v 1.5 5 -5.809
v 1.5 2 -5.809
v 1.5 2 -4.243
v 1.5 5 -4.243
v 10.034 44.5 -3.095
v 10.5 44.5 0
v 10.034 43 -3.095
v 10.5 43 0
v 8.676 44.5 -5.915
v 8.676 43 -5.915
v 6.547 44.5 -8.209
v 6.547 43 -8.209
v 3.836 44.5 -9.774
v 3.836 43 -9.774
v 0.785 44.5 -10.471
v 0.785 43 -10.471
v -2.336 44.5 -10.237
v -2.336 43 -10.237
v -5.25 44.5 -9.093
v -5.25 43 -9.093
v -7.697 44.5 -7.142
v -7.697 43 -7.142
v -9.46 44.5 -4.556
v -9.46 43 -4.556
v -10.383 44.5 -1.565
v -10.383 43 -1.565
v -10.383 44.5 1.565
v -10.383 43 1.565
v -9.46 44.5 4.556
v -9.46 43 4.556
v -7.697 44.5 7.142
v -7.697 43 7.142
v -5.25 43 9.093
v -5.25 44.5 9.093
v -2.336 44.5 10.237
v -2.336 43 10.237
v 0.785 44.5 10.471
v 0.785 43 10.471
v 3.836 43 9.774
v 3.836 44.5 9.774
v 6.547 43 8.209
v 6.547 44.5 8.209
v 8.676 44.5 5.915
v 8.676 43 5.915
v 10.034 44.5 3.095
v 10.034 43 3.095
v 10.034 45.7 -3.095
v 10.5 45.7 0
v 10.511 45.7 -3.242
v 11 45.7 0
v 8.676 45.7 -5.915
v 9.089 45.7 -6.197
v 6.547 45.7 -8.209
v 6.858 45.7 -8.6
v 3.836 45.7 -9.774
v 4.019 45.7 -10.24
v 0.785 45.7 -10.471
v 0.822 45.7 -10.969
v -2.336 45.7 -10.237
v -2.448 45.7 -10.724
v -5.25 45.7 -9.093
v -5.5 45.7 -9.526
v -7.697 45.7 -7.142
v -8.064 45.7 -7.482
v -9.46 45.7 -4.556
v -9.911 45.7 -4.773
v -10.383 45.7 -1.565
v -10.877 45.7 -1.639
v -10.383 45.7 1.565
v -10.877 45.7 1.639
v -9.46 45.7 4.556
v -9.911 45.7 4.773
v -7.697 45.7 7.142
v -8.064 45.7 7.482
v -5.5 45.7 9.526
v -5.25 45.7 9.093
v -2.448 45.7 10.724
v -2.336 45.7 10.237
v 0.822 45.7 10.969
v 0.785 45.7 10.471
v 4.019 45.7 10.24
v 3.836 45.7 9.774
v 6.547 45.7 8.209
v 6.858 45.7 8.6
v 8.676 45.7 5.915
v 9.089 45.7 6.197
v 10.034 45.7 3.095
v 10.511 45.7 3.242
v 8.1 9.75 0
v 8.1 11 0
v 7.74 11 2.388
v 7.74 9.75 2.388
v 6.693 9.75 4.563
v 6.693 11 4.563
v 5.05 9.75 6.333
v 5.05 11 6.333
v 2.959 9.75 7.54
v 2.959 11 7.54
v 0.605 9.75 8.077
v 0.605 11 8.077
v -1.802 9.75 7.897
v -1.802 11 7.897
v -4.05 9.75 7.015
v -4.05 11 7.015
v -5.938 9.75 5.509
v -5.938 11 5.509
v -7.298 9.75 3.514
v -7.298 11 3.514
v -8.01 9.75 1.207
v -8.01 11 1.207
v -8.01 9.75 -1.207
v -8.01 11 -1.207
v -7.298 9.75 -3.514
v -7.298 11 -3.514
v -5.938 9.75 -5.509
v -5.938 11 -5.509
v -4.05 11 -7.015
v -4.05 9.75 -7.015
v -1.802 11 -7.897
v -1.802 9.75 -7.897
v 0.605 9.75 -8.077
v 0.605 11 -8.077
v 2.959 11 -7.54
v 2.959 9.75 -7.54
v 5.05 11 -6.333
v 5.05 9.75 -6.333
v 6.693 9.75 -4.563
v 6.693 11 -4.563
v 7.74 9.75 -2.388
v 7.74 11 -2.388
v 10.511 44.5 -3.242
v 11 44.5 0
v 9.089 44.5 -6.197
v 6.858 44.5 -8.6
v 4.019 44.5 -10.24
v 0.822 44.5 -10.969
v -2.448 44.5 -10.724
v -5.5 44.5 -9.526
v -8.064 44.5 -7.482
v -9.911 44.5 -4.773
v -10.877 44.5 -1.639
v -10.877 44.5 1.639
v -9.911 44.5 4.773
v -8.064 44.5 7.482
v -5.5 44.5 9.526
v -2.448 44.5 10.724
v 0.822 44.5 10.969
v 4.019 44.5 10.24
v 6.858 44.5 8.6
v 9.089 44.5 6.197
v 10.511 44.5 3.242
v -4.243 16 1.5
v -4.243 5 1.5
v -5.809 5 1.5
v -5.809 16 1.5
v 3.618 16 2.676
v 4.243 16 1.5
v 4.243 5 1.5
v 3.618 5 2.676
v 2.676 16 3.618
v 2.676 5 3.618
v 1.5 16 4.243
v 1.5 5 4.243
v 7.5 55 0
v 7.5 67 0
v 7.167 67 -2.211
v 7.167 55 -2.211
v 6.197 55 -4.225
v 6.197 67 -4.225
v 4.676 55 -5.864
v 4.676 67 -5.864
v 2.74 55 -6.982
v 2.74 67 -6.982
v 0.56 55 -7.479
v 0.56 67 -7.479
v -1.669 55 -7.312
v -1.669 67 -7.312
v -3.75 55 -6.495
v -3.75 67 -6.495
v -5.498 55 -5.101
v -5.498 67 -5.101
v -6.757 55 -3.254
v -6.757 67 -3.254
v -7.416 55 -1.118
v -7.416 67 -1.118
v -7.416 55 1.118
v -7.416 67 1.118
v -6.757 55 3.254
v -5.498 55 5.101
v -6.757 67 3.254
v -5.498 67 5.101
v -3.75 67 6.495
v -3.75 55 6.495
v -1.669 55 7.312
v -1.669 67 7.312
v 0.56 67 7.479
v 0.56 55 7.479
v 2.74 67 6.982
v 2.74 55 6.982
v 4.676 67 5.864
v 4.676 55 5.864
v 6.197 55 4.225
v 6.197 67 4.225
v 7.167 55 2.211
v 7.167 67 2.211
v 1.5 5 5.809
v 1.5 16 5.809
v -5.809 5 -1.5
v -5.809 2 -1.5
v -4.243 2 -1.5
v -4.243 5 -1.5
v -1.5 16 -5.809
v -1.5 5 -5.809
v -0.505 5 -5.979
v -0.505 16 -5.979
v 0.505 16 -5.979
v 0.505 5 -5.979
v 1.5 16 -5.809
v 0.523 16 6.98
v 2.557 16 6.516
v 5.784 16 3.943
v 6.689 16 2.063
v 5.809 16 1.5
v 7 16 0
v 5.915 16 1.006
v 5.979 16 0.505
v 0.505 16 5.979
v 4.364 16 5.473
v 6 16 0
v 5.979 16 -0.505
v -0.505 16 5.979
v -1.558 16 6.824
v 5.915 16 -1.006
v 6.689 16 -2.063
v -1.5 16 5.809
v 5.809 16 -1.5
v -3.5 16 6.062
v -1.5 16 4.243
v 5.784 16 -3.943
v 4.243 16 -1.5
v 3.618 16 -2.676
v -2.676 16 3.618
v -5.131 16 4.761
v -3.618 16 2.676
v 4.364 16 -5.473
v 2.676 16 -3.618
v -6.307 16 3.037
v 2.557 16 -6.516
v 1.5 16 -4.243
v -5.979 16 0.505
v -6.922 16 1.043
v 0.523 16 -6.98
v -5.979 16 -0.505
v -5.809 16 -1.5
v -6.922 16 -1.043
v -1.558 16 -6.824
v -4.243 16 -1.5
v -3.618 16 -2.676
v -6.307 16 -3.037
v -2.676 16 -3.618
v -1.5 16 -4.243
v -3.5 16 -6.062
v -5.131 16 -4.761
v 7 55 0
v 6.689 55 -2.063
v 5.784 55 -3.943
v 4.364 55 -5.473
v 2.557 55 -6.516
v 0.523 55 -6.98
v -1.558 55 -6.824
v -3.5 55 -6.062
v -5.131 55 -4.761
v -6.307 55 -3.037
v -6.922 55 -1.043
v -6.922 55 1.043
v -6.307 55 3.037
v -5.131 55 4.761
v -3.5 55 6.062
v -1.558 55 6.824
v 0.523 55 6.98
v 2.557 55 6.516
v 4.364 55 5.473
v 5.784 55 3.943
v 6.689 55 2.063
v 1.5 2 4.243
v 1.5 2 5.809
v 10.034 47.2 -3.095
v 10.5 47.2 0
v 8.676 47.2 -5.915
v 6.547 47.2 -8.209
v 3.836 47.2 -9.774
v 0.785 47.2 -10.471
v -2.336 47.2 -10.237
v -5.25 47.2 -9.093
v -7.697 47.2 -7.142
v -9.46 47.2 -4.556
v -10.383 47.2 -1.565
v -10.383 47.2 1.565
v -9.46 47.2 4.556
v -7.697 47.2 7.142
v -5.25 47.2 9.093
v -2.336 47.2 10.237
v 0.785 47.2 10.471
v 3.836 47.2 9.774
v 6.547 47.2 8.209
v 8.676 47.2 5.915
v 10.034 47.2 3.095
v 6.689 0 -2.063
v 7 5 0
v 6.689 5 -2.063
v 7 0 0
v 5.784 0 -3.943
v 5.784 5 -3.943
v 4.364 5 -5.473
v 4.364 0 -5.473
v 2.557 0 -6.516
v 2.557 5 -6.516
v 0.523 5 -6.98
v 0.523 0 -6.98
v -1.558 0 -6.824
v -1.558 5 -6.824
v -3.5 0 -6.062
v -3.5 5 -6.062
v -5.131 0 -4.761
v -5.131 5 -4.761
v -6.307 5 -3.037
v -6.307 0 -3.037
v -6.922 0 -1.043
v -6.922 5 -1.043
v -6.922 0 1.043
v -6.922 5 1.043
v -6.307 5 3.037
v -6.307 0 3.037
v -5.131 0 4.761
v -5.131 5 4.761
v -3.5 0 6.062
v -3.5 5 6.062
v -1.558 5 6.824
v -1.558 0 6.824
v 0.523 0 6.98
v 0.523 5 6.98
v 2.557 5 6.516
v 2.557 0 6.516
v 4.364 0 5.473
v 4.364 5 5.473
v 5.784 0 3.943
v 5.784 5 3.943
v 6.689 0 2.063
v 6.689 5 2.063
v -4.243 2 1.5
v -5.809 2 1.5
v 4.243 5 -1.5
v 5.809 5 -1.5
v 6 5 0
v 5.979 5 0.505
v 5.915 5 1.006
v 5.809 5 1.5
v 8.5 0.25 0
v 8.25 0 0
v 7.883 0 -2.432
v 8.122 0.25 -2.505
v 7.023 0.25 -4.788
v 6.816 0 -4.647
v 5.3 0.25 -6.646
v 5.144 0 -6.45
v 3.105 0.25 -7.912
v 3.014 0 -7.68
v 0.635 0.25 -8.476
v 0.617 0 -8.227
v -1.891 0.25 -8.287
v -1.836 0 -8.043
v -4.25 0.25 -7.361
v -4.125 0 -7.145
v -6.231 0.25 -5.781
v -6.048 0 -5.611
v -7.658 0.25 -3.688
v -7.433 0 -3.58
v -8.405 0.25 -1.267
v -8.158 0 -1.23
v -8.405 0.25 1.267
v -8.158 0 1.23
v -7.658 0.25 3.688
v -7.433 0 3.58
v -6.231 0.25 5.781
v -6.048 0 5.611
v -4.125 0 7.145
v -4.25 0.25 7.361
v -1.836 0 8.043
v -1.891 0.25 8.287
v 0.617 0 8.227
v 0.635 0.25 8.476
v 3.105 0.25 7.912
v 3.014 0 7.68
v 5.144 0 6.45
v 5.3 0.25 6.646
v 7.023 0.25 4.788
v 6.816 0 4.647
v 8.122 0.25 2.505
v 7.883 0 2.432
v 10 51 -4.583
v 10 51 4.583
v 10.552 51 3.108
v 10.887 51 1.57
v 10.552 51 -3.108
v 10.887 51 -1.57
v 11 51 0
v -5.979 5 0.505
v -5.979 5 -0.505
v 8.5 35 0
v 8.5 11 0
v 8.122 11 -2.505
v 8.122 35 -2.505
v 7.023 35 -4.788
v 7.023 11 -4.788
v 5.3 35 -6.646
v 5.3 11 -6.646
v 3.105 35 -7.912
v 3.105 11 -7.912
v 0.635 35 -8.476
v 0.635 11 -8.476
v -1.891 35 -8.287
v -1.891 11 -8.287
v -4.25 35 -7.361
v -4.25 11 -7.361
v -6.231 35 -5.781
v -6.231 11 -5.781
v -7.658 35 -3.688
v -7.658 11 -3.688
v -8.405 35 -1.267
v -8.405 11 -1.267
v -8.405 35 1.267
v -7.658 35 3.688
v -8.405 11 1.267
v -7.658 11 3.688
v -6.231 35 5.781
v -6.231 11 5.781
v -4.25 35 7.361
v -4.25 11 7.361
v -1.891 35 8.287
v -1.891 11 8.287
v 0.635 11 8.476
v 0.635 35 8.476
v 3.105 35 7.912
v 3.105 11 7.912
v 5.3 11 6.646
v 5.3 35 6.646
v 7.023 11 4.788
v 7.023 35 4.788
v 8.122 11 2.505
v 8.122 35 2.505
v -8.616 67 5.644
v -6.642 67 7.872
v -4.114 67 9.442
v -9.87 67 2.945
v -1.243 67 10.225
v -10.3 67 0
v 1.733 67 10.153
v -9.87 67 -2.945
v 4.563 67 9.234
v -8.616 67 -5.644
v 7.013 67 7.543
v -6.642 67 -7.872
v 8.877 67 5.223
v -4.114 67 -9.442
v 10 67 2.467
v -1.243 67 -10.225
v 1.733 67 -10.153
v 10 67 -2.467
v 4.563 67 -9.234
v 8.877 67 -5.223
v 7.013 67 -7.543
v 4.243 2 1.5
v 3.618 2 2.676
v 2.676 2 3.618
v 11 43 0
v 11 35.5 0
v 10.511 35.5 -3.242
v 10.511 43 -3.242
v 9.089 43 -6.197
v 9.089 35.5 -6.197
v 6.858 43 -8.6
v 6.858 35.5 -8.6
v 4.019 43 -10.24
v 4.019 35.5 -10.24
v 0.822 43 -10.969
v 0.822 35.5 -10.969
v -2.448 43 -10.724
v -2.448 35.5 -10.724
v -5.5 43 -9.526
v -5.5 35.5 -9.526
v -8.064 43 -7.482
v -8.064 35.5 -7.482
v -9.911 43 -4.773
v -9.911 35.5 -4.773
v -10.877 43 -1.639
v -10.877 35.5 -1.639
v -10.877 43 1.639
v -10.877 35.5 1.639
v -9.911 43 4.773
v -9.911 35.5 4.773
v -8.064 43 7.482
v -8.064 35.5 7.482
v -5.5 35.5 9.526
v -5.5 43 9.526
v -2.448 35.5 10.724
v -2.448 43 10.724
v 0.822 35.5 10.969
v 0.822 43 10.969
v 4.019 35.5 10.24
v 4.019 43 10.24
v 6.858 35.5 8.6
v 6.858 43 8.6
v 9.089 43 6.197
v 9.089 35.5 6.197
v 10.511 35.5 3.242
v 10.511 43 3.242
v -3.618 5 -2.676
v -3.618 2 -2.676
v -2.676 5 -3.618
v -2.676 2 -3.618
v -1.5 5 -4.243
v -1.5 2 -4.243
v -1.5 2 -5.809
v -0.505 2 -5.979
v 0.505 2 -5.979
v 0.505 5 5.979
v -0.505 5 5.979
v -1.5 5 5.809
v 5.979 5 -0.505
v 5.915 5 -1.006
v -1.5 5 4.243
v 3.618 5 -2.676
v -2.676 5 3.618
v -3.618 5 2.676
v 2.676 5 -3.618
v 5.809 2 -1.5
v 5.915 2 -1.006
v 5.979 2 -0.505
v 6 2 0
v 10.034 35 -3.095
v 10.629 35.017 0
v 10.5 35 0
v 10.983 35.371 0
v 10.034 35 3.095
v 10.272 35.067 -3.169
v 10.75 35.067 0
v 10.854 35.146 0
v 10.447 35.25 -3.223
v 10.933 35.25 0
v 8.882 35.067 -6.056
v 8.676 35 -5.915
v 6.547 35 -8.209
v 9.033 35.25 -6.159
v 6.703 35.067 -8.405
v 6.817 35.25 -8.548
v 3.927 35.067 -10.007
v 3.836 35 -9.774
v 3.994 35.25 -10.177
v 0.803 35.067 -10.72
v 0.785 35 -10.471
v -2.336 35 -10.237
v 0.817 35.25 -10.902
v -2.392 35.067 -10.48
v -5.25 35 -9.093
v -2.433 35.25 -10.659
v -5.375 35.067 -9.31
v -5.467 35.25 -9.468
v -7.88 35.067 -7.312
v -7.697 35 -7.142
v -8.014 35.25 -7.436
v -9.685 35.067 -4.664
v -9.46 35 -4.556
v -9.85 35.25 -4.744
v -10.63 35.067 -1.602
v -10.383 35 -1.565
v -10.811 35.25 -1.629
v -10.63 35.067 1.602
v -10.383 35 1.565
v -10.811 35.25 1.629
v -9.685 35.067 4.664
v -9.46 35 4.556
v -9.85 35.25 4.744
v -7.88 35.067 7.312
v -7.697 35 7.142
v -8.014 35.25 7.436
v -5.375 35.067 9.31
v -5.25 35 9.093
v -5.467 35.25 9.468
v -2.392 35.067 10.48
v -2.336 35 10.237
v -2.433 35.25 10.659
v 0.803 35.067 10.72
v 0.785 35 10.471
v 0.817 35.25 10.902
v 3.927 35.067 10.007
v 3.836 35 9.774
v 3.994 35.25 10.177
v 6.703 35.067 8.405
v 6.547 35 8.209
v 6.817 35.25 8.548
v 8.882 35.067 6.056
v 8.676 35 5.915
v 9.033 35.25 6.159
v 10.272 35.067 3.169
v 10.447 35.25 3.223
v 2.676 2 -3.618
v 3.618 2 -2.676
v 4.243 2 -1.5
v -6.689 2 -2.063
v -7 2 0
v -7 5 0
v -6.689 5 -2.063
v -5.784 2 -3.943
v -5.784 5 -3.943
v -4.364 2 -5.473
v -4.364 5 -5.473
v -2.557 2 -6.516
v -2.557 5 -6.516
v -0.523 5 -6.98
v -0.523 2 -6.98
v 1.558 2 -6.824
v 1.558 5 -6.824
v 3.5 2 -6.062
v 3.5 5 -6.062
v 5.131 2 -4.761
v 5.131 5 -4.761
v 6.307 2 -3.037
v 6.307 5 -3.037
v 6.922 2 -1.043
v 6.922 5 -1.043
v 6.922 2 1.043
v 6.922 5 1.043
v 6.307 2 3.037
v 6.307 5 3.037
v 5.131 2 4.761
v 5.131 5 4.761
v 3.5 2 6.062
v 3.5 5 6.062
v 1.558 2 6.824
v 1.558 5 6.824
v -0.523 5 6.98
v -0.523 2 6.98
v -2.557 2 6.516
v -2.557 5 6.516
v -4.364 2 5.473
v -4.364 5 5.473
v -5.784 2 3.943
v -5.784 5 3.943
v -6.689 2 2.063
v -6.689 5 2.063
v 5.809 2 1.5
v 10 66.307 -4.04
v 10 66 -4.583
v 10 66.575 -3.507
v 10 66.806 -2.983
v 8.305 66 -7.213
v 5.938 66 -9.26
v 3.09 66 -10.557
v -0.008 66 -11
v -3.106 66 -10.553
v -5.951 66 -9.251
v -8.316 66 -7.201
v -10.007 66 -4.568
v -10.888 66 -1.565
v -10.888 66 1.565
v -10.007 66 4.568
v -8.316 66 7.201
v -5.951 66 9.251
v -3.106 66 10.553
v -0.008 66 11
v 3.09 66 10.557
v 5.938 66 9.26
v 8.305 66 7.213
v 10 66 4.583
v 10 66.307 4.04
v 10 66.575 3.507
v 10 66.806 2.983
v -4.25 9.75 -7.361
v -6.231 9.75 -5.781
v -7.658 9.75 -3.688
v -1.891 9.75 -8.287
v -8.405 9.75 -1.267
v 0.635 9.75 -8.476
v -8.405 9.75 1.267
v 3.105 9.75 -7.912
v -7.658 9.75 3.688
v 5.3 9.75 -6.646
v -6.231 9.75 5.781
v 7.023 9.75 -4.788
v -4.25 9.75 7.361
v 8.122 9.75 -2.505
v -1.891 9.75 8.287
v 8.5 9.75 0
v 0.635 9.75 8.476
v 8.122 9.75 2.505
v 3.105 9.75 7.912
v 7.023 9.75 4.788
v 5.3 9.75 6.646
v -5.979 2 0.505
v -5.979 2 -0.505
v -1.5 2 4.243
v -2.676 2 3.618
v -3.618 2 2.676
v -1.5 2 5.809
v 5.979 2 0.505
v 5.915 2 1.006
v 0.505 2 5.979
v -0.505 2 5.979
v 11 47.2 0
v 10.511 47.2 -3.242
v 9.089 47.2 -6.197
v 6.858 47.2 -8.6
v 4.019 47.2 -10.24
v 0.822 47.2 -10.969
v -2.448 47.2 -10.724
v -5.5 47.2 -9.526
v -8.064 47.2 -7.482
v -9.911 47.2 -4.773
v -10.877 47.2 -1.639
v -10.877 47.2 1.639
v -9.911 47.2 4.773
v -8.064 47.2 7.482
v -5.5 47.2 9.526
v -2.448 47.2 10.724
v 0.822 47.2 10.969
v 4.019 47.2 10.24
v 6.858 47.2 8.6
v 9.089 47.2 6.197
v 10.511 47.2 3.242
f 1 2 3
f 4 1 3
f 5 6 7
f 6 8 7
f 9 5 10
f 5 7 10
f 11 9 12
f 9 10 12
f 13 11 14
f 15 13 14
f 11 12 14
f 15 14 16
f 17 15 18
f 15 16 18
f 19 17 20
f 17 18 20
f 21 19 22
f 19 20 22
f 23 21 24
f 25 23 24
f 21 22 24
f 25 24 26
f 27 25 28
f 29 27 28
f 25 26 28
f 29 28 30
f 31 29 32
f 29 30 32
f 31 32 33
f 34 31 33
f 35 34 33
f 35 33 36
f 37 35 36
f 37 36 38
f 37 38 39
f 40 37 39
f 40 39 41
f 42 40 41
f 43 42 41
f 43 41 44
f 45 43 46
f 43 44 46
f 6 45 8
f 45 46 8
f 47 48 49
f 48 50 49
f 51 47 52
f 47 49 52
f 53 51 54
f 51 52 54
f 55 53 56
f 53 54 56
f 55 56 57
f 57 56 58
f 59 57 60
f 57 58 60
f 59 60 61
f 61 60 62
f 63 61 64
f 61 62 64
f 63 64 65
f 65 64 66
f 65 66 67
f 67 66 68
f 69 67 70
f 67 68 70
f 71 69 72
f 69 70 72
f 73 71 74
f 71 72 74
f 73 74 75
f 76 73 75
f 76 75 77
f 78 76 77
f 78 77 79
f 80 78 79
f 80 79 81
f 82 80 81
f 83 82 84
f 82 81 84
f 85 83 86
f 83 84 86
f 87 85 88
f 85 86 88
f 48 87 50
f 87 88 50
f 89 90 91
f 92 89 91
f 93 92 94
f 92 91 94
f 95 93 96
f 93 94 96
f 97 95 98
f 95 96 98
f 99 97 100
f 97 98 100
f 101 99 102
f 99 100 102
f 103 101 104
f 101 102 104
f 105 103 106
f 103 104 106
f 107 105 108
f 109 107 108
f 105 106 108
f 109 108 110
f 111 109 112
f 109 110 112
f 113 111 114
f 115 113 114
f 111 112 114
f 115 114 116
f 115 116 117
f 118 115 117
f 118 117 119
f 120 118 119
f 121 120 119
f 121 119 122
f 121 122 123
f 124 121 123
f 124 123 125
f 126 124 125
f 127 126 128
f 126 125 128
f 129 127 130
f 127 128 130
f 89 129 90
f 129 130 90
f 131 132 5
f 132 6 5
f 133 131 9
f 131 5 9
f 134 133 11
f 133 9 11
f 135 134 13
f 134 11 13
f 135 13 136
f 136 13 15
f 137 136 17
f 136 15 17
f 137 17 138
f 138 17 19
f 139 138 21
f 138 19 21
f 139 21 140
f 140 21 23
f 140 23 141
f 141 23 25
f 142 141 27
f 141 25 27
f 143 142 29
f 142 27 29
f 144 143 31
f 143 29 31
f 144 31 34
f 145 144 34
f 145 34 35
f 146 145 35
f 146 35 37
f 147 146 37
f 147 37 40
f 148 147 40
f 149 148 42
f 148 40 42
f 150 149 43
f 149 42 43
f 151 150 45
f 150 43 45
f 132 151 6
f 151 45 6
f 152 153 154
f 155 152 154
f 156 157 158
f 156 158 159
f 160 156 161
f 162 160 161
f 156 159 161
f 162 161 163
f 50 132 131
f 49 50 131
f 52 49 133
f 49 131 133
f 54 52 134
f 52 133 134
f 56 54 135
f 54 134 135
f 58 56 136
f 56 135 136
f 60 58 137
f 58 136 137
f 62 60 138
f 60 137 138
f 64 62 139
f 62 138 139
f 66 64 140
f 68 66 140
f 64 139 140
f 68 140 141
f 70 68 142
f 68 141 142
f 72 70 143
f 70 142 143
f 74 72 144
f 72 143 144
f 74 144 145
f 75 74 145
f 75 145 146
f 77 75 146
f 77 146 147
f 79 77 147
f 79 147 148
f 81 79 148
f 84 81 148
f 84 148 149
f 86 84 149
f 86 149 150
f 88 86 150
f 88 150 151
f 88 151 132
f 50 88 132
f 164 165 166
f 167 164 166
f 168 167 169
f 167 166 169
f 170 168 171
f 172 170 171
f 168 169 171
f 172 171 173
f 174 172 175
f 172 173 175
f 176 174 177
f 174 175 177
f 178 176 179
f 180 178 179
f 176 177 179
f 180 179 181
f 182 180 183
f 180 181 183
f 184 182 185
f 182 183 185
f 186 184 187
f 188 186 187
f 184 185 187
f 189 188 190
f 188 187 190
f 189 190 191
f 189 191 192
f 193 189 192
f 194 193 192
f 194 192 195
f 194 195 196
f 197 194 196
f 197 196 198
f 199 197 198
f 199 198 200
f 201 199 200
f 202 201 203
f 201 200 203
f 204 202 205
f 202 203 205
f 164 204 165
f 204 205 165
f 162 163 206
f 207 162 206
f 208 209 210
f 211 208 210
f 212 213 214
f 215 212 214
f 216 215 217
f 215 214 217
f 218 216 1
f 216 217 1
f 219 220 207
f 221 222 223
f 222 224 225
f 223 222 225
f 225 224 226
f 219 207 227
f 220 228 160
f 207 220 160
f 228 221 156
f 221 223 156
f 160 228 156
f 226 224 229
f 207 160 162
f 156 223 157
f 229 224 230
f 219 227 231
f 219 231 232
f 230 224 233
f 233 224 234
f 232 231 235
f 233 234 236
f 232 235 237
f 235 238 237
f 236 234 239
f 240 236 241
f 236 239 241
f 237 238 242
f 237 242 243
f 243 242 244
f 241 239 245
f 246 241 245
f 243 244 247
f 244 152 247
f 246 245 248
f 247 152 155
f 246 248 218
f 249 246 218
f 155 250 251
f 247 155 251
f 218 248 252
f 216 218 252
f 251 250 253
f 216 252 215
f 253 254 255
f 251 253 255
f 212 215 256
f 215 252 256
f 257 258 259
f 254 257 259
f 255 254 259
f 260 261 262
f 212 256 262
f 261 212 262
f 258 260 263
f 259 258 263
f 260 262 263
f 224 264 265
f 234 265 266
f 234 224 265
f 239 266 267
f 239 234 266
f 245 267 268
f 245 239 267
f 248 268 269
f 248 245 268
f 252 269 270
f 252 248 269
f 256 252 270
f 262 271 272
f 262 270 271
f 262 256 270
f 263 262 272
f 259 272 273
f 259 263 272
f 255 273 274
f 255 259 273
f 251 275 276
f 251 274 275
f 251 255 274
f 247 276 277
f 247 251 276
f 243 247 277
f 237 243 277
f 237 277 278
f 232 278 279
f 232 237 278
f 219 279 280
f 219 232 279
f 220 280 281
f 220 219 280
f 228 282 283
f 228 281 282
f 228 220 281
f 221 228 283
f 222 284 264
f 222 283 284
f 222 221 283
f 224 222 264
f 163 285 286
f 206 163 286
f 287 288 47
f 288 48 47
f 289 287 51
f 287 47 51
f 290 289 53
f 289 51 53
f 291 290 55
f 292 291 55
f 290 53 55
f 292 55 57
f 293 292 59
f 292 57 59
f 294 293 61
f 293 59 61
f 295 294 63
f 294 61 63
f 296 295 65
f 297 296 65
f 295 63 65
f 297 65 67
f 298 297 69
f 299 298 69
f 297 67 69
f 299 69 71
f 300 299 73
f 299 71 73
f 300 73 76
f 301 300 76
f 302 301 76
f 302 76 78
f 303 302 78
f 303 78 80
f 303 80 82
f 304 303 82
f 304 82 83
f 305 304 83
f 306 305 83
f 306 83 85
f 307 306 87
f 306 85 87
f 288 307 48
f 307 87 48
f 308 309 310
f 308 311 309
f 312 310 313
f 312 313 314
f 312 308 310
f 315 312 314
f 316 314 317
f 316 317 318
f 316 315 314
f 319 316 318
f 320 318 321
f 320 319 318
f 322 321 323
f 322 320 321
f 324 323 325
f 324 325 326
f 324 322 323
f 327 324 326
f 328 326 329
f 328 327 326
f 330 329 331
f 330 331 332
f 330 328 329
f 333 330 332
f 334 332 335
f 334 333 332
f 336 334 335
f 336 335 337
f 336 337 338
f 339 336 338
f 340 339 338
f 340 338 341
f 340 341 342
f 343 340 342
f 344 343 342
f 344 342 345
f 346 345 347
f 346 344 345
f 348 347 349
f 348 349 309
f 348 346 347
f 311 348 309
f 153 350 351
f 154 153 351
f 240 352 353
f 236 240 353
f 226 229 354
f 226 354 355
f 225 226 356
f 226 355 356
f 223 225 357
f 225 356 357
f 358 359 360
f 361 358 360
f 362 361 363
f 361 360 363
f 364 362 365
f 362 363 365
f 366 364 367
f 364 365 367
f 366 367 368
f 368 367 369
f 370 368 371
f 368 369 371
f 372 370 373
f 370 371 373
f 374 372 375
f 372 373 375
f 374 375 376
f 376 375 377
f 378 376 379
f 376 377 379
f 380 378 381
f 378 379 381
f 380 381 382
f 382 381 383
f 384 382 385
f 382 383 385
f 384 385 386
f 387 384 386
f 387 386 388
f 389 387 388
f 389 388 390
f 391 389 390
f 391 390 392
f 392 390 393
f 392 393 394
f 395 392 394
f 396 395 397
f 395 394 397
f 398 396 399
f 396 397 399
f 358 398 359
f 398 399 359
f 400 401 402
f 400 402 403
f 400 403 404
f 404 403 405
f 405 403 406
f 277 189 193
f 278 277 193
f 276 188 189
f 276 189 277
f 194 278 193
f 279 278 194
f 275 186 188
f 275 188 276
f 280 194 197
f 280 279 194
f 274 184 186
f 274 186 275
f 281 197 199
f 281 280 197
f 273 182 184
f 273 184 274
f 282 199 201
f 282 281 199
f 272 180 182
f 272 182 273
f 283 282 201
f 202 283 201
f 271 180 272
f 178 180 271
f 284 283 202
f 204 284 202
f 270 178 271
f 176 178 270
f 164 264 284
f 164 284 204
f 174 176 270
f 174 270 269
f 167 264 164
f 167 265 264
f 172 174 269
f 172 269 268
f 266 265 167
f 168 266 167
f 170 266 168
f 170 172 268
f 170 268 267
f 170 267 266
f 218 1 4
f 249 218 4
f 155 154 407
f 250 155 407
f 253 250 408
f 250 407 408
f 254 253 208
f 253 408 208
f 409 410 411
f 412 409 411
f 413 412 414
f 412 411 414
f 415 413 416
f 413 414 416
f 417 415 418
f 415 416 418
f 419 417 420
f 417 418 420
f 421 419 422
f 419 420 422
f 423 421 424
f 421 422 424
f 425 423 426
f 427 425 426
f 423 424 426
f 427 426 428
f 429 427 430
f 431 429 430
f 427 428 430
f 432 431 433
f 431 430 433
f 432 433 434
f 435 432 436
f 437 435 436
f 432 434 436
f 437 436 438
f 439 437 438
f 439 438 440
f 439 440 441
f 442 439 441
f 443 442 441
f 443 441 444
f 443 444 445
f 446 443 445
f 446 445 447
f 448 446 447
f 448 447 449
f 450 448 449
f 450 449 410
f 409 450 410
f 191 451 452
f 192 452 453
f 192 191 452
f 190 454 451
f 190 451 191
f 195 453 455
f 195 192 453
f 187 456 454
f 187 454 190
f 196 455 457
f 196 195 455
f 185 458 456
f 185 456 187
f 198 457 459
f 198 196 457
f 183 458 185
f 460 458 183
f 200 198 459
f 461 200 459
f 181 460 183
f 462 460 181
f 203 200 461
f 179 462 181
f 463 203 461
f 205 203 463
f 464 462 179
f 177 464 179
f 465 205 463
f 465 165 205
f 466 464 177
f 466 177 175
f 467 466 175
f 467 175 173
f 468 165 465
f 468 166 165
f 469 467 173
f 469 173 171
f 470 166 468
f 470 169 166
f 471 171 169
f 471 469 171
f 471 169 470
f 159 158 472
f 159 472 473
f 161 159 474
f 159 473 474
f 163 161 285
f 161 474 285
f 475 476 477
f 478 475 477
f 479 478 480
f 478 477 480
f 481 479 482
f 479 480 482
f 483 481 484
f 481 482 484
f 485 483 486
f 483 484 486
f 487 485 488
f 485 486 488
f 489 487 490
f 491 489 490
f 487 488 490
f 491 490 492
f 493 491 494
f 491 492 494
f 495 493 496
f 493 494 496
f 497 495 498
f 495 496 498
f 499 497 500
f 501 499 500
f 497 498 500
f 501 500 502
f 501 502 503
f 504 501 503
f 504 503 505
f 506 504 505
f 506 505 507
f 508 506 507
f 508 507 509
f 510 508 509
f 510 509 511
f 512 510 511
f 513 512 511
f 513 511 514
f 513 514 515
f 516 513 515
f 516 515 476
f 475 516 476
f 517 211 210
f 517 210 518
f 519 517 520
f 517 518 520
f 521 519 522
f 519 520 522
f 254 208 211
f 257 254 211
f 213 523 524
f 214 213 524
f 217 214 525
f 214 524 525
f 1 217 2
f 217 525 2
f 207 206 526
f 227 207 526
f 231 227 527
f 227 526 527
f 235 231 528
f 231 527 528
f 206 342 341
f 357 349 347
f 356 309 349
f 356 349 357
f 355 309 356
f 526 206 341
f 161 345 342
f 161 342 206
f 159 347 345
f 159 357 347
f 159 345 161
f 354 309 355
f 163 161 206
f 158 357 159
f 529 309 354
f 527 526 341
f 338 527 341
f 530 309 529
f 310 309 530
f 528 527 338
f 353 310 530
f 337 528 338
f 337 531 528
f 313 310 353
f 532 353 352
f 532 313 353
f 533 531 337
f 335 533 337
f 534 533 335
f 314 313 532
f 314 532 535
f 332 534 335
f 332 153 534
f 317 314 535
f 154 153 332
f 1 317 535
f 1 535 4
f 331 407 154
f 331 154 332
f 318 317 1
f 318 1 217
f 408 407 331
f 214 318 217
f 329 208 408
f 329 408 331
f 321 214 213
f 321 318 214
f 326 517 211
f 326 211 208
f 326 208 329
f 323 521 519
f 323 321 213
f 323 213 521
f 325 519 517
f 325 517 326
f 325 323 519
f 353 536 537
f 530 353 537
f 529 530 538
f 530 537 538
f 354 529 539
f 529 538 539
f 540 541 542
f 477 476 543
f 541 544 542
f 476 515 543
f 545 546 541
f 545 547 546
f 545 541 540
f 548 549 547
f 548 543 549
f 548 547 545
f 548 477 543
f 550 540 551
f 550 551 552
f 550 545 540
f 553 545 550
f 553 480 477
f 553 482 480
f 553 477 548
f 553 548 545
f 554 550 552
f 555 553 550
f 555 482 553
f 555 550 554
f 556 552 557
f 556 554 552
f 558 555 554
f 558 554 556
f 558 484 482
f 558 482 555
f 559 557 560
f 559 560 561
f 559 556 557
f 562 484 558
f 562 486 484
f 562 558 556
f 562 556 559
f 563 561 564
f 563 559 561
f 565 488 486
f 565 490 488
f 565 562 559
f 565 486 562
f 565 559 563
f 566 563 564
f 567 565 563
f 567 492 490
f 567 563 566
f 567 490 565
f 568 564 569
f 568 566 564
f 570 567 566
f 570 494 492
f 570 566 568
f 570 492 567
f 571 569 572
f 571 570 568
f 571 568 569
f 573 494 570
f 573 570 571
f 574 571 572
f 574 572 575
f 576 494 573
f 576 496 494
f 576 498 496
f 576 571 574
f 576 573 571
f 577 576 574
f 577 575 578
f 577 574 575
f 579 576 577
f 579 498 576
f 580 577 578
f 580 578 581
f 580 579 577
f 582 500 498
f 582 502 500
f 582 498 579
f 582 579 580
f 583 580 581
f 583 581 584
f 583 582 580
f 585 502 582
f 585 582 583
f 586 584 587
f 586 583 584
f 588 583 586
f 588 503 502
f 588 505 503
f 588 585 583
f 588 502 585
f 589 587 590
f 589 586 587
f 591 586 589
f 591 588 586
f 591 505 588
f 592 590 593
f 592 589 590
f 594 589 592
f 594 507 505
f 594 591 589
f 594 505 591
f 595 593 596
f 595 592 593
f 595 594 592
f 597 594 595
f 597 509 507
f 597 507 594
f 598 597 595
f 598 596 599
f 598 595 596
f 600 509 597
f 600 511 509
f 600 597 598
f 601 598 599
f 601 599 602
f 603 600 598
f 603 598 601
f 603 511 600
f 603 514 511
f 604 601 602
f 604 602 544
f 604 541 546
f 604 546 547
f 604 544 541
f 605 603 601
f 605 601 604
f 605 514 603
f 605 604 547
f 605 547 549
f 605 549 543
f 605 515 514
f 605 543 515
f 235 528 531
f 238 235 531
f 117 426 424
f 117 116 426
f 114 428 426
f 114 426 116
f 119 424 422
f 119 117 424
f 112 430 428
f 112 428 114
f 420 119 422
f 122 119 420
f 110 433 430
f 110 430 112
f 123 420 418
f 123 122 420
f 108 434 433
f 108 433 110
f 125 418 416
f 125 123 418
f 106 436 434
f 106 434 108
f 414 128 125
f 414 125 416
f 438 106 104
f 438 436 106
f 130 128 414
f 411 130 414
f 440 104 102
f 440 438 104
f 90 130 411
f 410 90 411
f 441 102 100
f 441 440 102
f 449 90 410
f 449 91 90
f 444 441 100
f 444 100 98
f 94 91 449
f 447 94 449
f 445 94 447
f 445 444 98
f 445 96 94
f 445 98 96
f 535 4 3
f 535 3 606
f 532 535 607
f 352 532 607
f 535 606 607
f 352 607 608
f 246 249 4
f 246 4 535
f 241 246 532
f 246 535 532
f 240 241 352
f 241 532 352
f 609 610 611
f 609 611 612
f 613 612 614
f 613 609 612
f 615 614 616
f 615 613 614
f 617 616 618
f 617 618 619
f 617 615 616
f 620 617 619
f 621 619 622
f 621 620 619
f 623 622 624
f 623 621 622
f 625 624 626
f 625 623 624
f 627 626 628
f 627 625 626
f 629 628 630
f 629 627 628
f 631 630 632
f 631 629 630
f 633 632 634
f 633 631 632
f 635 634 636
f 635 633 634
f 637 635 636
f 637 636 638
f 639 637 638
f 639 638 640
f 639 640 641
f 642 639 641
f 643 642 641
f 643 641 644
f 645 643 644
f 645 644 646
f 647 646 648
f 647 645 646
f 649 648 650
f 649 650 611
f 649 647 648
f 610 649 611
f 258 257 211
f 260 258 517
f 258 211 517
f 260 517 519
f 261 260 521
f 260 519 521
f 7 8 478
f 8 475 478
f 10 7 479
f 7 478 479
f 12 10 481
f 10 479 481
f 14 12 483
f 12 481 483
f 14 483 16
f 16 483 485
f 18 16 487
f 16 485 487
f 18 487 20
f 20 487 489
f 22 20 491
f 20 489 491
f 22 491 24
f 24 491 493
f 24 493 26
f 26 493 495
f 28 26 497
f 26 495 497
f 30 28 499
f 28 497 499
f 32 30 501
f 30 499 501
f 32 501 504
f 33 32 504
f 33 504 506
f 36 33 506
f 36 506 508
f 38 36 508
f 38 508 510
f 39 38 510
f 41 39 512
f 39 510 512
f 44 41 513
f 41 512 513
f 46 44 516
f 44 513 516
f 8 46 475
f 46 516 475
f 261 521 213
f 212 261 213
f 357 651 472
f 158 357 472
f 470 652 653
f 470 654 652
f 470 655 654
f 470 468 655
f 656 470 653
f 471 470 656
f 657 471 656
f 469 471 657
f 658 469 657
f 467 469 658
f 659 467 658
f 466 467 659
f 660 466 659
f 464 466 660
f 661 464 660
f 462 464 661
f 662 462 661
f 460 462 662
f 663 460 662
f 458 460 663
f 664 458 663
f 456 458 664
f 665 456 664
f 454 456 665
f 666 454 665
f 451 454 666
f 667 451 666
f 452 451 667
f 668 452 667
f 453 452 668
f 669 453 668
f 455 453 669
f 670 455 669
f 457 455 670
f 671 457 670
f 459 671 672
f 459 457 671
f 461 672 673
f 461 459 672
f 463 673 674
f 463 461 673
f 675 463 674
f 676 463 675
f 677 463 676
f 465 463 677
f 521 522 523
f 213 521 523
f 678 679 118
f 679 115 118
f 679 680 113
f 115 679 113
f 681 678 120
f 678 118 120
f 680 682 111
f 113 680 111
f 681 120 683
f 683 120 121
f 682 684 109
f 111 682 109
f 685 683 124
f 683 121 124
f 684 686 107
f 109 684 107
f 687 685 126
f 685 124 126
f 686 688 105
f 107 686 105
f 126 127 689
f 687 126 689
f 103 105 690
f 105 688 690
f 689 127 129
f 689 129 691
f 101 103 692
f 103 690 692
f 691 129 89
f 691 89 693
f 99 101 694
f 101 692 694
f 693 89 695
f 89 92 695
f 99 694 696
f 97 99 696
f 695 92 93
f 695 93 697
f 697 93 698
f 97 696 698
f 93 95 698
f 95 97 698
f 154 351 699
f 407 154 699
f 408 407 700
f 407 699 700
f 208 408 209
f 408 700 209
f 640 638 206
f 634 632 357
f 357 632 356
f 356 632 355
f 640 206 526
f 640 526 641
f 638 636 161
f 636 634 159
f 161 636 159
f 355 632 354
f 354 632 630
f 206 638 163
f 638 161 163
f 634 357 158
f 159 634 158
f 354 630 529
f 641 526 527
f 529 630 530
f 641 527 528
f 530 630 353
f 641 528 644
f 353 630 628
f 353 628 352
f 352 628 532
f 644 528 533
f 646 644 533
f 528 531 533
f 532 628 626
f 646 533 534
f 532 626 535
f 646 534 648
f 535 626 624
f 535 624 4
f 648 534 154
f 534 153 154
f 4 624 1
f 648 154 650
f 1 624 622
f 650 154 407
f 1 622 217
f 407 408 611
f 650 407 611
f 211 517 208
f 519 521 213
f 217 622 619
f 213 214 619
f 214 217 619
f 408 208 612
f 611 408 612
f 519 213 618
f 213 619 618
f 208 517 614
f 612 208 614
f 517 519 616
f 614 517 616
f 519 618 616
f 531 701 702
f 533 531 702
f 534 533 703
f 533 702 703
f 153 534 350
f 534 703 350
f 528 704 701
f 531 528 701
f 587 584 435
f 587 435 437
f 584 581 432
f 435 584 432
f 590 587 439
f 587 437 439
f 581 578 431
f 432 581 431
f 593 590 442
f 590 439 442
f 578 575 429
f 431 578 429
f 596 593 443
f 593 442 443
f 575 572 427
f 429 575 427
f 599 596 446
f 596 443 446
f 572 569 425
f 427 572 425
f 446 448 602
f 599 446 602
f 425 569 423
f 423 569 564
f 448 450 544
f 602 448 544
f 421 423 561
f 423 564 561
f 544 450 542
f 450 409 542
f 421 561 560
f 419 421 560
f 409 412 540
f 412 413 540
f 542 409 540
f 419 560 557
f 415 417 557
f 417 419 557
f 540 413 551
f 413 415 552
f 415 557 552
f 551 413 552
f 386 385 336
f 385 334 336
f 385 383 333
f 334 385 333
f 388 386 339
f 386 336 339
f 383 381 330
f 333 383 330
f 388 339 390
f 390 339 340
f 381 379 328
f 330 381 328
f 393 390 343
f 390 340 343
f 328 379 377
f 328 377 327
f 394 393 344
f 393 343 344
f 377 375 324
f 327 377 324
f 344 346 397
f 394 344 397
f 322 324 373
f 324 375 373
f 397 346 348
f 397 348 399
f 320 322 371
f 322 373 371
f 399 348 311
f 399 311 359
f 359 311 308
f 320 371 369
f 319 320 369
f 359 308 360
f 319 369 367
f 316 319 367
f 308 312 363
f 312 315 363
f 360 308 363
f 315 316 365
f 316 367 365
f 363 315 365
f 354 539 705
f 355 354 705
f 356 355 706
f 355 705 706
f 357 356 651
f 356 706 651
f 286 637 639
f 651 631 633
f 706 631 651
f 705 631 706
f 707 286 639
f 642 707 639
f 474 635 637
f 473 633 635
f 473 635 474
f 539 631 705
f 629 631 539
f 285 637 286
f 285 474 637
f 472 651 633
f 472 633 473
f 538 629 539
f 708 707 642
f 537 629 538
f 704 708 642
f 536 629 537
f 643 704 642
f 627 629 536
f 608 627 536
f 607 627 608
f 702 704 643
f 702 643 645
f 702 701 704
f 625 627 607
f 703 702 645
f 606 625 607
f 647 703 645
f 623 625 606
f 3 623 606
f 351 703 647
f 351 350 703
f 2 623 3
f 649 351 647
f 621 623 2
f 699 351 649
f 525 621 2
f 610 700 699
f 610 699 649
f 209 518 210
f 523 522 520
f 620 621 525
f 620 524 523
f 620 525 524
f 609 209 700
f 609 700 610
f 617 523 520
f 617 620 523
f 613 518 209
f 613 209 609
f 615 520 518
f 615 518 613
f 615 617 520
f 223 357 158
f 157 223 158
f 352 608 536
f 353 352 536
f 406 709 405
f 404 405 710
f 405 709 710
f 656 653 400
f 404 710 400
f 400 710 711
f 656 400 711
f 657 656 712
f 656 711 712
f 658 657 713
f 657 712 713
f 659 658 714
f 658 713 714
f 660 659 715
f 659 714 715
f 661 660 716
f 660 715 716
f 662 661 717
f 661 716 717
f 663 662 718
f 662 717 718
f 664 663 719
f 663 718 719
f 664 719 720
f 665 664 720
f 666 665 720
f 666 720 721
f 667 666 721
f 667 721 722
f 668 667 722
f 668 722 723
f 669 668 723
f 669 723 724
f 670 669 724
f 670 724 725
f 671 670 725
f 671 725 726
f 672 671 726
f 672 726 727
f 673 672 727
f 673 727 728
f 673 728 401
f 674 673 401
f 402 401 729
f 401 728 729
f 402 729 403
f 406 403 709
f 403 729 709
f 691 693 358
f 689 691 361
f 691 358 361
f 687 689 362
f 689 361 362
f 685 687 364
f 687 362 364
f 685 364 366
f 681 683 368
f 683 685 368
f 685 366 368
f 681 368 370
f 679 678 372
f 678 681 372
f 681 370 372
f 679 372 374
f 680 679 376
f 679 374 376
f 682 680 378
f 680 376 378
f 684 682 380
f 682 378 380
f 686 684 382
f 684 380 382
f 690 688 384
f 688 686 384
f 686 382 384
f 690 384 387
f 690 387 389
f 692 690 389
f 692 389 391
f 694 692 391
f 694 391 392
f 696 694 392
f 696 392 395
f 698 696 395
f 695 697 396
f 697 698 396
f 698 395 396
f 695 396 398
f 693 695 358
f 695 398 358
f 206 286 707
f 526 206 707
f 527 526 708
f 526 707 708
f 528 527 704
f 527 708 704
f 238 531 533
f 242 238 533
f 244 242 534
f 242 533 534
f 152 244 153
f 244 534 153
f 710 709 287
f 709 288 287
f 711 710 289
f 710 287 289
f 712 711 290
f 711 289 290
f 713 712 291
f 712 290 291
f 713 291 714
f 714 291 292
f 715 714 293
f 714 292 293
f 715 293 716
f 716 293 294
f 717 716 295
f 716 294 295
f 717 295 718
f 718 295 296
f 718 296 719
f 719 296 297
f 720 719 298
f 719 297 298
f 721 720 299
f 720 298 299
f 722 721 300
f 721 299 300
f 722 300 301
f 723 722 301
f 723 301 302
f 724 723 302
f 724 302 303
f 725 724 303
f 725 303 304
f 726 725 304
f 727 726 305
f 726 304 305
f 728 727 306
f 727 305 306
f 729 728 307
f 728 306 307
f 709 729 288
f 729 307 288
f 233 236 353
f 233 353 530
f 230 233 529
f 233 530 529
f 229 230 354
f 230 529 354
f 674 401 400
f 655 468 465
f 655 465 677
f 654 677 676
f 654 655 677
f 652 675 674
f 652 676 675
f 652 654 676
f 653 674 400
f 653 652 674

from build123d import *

# Parameters (mm, degrees)
SKETCH3_R           = 8.5
SKETCH3_R_2         = 7
BOSS_EXTRUDE1_DEPTH = 35
SKETCH4_R           = 11
SKETCH4_R_2         = 7
BOSS_EXTRUDE2_DEPTH = 32
SKETCH9_W           = 0.5
SKETCH9_H           = 1.5
SKETCH11_W          = 2
SKETCH11_H          = 10
CUT_EXTRUDE1_DEPTH  = 16
CHAMFER2_SIZE       = 1
CHAMFER2_SIZE2      = 0.700207538
FILLET1_R           = 0.5
CHAMFER3_SIZE       = 0.25
SKETCH14_R          = 7.5
CUT_EXTRUDE3_DEPTH  = 12
BOSS_EXTRUDE3_START = -2
SKETCH12_R          = 7
SKETCH12_R_2        = 4.5
BOSS_EXTRUDE3_DEPTH = 3
BOSS_EXTRUDE4_START = -5
SKETCH12_2_R        = 7
SKETCH12_2_R_2      = 4.5
BOSS_EXTRUDE4_DEPTH = 11
CUT_EXTRUDE2_DEPTH  = 68
CUT_EXTRUDE4_START  = -11
SKETCH15_R          = 8.75
SKETCH15_R_2        = 8.1
CUT_EXTRUDE4_DEPTH  = 1.25


with BuildPart() as part:
    # Sketch3 → Boss-Extrude1 (new body)
    with BuildSketch(Plane(origin=(0, 0, 0), x_dir=(1, 0, 0), z_dir=(0, 1, 0))):
        Circle(SKETCH3_R)
        Circle(SKETCH3_R_2, mode=Mode.SUBTRACT)
    extrude(amount=BOSS_EXTRUDE1_DEPTH)

    # Sketch4 → Boss-Extrude2 (add)
    with BuildSketch(Plane(origin=(0, 35, 0), x_dir=(1, 0, 0), z_dir=(0, 1, 0))):
        Circle(SKETCH4_R)
        Circle(SKETCH4_R_2, mode=Mode.SUBTRACT)
    extrude(amount=BOSS_EXTRUDE2_DEPTH)

    # Cut-Sweep1: sweep along a path in Sketch6
    with BuildLine(Plane(origin=(0, 43, 0), x_dir=(1, 0, 0), z_dir=(0, 1, 0))) as cut_sweep1_path:
        CenterArc((0, 0), 11, 0, 360)
    # Sketch9 → Cut-Sweep1 (sweep, cut)
    with BuildSketch(Plane(origin=(0, 0, 0), x_dir=(0, 0, -1), z_dir=(1, 0, 0))):
        with Locations((10.75, 43.75)):
            Rectangle(SKETCH9_W, SKETCH9_H)
        with Locations((10.75, 46.45)):
            Rectangle(SKETCH9_W, SKETCH9_H)
    sweep(path=cut_sweep1_path.line, mode=Mode.SUBTRACT)

    # Sketch11 → Cut-Extrude1 (cut)
    with BuildSketch(Plane(origin=(0, 67, 0), x_dir=(1, 0, 0), z_dir=(0, 1, 0))):
        with Locations((11, 0)):
            Rectangle(SKETCH11_W, SKETCH11_H)
    extrude(amount=-CUT_EXTRUDE1_DEPTH, mode=Mode.SUBTRACT)

    # Chamfer2
    chamfer2_edges = [part.edges().sort_by_distance(p)[0] for p in [
        (-11, 67, 0),
    ]]
    chamfer2_side = [part.faces().sort_by_distance(p)[0] for p in [
        (-11, 57.1, 0),
    ]]
    chamfer(chamfer2_edges, length=CHAMFER2_SIZE, length2=CHAMFER2_SIZE2, reference=chamfer2_side[0])

    # Fillet1
    fillet1_edges = [part.edges().sort_by_distance(p)[0] for p in [
        (-11, 35, 0),
    ]]
    fillet(fillet1_edges, radius=FILLET1_R)

    # Chamfer3
    chamfer3_edges = [part.edges().sort_by_distance(p)[0] for p in [
        (-8.5, 0, 0),
    ]]
    chamfer(chamfer3_edges, length=CHAMFER3_SIZE)

    # Sketch14 → Cut-Extrude3 (cut)
    with BuildSketch(Plane(origin=(0, 67, 0), x_dir=(1, 0, 0), z_dir=(0, 1, 0))):
        Circle(SKETCH14_R)
    extrude(amount=-CUT_EXTRUDE3_DEPTH, mode=Mode.SUBTRACT)


with BuildPart() as body_2:
    # Sketch12 → Boss-Extrude3 (new body)
    with BuildSketch(Plane(origin=(0, 0, 0), x_dir=(-1, 0, 0), z_dir=(0, -1, 0)).offset(BOSS_EXTRUDE3_START)):
        Circle(SKETCH12_R)
        Circle(SKETCH12_R_2, mode=Mode.SUBTRACT)
    extrude(amount=-BOSS_EXTRUDE3_DEPTH)


with BuildPart() as body_3:
    # Sketch12<2> → Boss-Extrude4 (new body)
    with BuildSketch(Plane(origin=(0, 0, 0), x_dir=(-1, 0, 0), z_dir=(0, -1, 0)).offset(BOSS_EXTRUDE4_START)):
        Circle(SKETCH12_2_R)
        Circle(SKETCH12_2_R_2, mode=Mode.SUBTRACT)
    extrude(amount=-BOSS_EXTRUDE4_DEPTH)

    # Combine1: union part
    add(part.part)


with BuildPart() as cut_extrude2_tool:
    # Sketch13 → Cut-Extrude2 (new body, through all)
    with BuildSketch(Plane.XZ):
        with BuildLine():
            Line((-4.242640687, 1.5), (-5.809475019, 1.5))
            ThreePointArc((-5.809475019, 1.5), (-6, 0), (-5.809475019, -1.5))
            Line((-5.809475019, -1.5), (-4.242640687, -1.5))
            ThreePointArc((-4.242640687, -1.5), (-4.5, 0), (-4.242640687, 1.5))
        make_face()
        with BuildLine():
            Line((1.5, 4.242640687), (1.5, 5.809475019))
            ThreePointArc((1.5, 5.809475019), (0, 6), (-1.5, 5.809475019))
            Line((-1.5, 5.809475019), (-1.5, 4.242640687))
            ThreePointArc((-1.5, 4.242640687), (0, 4.5), (1.5, 4.242640687))
        make_face()
        with BuildLine():
            ThreePointArc((6, 0), (5.952178178, 0.756025755), (5.809475019, 1.5))
            Line((5.809475019, 1.5), (4.242640687, 1.5))
            ThreePointArc((4.242640687, 1.5), (4.435193518, 0.760958904), (4.5, 0))
            ThreePointArc((4.5, 0), (4.435193518, -0.760958904), (4.242640687, -1.5))
            Line((4.242640687, -1.5), (5.809475019, -1.5))
            ThreePointArc((5.809475019, -1.5), (5.952178178, -0.756025755), (6, 0))
        make_face()
        with BuildLine():
            ThreePointArc((-1.5, -5.809475019), (0, -6), (1.5, -5.809475019))
            Line((1.5, -5.809475019), (1.5, -4.242640687))
            ThreePointArc((1.5, -4.242640687), (0, -4.5), (-1.5, -4.242640687))
            Line((-1.5, -4.242640687), (-1.5, -5.809475019))
        make_face()
    extrude(amount=-CUT_EXTRUDE2_DEPTH)


with BuildPart() as body_2_1:
    add(body_2.part)

    # Cut-Extrude2: cut by cut_extrude2_tool
    add(cut_extrude2_tool.part, mode=Mode.SUBTRACT)


with BuildPart() as body_3_1:
    add(body_3.part)

    # Cut-Extrude2: cut by cut_extrude2_tool
    add(cut_extrude2_tool.part, mode=Mode.SUBTRACT)

    # Sketch15 → Cut-Extrude4 (cut)
    with BuildSketch(Plane.XZ.offset(CUT_EXTRUDE4_START)):
        Circle(SKETCH15_R)
        Circle(SKETCH15_R_2, mode=Mode.SUBTRACT)
    extrude(amount=CUT_EXTRUDE4_DEPTH, mode=Mode.SUBTRACT)


solid = Compound([body_2_1.part, body_3_1.part])
